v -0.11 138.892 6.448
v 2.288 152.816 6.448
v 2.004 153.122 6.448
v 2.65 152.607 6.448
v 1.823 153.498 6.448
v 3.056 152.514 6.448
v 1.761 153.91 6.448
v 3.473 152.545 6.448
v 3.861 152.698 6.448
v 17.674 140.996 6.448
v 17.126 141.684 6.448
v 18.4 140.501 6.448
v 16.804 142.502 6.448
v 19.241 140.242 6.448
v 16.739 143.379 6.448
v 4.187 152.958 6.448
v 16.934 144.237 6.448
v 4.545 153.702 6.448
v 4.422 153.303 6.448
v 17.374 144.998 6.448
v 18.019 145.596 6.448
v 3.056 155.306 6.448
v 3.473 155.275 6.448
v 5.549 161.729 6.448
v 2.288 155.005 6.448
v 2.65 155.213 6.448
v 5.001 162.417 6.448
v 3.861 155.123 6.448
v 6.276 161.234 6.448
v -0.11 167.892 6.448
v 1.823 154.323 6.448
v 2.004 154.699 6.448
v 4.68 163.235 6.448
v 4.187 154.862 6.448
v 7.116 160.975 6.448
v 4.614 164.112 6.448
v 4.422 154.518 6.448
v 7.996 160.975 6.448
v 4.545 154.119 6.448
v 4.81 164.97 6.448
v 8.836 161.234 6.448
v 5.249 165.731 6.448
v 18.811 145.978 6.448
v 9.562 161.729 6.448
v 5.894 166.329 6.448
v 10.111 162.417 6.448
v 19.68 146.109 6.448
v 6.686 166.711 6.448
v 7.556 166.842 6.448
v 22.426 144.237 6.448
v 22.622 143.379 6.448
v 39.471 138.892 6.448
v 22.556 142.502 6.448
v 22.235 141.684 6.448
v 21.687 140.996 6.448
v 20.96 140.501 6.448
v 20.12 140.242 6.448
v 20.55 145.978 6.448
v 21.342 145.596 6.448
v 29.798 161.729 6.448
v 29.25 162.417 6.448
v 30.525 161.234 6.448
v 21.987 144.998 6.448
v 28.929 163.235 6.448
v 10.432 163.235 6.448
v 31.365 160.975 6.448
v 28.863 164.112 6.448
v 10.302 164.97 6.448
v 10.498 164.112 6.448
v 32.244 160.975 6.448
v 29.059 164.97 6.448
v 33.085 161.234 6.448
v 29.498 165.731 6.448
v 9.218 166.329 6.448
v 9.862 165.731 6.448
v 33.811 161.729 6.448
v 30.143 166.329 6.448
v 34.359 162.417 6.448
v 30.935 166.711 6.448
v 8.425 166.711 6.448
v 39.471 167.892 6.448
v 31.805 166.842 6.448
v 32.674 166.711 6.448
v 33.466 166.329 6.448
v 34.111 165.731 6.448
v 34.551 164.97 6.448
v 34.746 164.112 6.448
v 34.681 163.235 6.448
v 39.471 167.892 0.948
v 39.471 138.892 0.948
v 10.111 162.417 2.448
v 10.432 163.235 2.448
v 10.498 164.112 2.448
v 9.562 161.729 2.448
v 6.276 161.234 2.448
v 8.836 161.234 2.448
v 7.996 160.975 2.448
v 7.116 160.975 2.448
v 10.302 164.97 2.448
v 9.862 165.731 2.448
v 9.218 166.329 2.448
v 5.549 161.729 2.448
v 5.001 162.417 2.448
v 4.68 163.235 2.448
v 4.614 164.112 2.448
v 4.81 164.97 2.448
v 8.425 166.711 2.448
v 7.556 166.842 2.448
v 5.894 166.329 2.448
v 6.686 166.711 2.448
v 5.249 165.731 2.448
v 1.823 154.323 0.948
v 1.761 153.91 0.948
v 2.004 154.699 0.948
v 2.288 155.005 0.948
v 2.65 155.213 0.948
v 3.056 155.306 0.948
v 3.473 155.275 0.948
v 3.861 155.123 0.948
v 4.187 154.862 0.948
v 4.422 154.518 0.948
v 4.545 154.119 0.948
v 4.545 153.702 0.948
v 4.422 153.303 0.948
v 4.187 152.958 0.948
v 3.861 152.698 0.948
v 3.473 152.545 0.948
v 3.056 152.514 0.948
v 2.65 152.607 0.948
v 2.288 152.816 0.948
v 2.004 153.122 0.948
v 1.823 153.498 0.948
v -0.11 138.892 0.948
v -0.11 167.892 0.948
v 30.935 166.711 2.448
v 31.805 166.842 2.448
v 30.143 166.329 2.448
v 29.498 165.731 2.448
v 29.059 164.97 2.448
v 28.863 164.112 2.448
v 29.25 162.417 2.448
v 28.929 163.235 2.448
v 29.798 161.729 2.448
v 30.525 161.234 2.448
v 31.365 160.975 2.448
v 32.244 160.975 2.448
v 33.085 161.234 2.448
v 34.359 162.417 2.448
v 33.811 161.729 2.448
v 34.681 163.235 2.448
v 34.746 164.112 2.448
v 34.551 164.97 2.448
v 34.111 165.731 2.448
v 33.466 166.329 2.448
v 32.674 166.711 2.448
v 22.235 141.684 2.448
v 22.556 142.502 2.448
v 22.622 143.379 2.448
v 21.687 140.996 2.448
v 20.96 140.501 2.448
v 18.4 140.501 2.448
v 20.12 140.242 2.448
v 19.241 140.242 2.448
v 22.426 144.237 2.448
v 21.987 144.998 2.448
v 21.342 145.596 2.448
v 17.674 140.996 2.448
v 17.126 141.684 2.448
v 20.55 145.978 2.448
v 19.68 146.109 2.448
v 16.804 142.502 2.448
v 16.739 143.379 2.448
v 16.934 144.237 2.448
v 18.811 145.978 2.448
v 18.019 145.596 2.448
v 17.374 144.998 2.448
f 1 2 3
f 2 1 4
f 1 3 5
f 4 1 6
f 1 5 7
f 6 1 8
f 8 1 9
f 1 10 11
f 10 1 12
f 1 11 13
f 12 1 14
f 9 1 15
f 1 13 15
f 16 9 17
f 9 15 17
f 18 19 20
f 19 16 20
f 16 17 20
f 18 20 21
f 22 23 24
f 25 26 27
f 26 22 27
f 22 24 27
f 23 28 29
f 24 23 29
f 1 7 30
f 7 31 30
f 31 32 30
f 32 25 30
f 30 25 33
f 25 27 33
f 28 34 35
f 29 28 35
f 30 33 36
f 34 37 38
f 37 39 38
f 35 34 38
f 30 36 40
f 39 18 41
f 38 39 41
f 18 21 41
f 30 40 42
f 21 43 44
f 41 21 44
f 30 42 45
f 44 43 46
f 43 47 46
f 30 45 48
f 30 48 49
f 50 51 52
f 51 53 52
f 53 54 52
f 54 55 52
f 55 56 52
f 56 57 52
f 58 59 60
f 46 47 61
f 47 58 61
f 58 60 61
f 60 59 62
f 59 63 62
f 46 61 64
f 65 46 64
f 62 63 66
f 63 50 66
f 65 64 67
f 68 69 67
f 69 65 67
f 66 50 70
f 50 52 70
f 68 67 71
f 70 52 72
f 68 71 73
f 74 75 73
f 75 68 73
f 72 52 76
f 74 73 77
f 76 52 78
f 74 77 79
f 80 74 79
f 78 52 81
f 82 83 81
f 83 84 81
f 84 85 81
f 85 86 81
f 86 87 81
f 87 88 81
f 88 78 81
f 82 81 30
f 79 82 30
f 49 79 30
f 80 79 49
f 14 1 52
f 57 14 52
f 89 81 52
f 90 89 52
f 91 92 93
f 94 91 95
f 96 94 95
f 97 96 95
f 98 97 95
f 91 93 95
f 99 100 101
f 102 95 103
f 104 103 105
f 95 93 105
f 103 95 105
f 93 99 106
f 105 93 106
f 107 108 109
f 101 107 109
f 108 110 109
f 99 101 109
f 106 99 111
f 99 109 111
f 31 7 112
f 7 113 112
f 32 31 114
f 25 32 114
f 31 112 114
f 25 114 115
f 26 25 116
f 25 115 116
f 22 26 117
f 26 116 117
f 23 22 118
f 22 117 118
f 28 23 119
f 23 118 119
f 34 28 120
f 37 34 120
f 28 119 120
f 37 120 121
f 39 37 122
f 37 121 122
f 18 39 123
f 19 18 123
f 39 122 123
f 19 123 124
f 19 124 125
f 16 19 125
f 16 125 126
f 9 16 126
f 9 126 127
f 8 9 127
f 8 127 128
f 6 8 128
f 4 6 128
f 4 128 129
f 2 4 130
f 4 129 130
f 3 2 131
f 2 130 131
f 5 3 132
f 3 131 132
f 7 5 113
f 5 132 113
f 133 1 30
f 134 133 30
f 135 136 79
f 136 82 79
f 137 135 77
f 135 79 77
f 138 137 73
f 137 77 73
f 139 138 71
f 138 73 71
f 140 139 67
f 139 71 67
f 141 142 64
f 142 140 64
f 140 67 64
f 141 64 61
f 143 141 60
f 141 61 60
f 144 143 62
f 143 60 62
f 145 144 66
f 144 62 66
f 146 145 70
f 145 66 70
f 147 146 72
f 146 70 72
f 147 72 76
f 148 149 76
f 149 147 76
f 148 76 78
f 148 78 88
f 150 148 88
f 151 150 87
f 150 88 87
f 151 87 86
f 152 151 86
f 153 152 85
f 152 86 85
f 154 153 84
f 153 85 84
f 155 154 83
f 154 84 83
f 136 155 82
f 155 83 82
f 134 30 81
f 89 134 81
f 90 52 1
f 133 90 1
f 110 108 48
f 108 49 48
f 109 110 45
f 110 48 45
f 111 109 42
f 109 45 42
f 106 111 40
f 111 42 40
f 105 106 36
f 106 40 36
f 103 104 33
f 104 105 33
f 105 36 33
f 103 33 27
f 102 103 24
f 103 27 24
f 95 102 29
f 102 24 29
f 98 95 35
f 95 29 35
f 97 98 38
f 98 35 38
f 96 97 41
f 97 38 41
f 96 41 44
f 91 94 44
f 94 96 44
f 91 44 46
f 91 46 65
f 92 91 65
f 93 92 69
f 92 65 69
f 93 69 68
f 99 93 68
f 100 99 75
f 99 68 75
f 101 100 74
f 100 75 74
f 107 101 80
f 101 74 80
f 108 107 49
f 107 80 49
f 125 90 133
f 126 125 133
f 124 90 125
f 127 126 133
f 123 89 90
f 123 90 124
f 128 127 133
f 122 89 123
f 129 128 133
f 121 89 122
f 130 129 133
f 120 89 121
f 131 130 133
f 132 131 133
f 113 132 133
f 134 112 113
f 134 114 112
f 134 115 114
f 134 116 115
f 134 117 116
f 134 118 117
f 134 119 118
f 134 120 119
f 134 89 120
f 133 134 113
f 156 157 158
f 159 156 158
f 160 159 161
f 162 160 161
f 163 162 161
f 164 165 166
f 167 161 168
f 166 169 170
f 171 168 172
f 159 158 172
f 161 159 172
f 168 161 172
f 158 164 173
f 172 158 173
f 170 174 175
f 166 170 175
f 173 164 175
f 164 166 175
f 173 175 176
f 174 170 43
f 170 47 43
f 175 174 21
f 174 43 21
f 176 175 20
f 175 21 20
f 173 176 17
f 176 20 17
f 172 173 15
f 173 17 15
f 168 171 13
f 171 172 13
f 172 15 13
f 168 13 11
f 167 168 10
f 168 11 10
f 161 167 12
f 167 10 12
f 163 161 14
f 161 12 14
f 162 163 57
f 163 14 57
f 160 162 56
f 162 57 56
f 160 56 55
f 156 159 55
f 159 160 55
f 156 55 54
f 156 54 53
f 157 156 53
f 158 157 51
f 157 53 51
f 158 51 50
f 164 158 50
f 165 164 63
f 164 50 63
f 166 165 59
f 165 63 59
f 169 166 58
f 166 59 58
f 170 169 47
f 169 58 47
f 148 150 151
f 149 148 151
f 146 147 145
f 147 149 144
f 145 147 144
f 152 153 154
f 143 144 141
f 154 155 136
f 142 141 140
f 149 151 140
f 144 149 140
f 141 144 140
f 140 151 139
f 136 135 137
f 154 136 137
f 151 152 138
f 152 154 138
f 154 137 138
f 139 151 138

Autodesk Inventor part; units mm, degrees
ref_plane "YZ Plane" through (0, 0, 0) normal (1, 0, 0) x (0, 1, 0)
ref_plane "XZ Plane" through (0, 0, 0) normal (0, 1, 0) x (-1, 0, 0)
ref_plane "XY Plane" through (0, 0, 0) normal (0, 0, 1) x (1, 0, 0)
ref_plane "Work Plane1" through (52.5141, 202.7033, 6.4479) normal (0, 0, -1) x (0, 1, 0)
sketch "Sketch1" plane through (52.5141, 202.7033, 6.4479) normal (0, 0, -1) x (0, 1, 0)
  line L0 (-34.8114, -13.0433) -> (-63.8114, -13.0433)
  line L1 (-63.8114, -13.0433) -> (-63.8114, -52.6244)
  line L2 (-63.8114, -52.6244) -> (-34.8114, -52.6244)
  line L3 (-34.8114, -52.6244) -> (-34.8114, -13.0433)
  circle A0 centre (-59.5444, -32.8338) radius 2.95
  circle A1 centre (-38.8114, -20.7095) radius 2.95
  circle A2 centre (-38.8114, -44.9582) radius 2.95 construction
  line L4 (-60.26, -25.0657) -> (-36.5, -25.0657) construction
  line L5 (-36.5, -25.0657) -> (-36.5, -52.0657) construction
  line L6 (-60.26, -52.0657) -> (-60.26, -25.0657) construction
  line L7 (-57.1632, -22.5233) -> (-33.4032, -22.5233) construction
  line L8 (-33.4032, -22.5233) -> (-33.4032, -49.5233) construction
  line L9 (-33.4032, -49.5233) -> (-57.1632, -49.5233) construction
  line L10 (-57.1632, -49.5233) -> (-57.1632, -22.5233) construction
  circle A3 centre (-38.8114, -44.9582) radius 2.95
  point P0 (-202.7033, -52.5141)
  point P1 (-56.7146, -27.9576)
  point P2 (-25.3114, -32.8338)
  dimension "d4" = 5.9
  dimension "d5" = 5.9
  dimension "d6" = 5.9
  dimension "d37" = 12.1244
  dimension "d38" = 12.1244
extrude "Extrusion1" add sketch "Sketch1" along normal blind 4
sketch "Sketch2" plane through (52.5141, 202.7033, 2.4479) normal (0, 0, -1) x (-1, 0, 0)
  circle A0 centre (44.9582, -38.8114) radius 2.95 projected
  circle A1 centre (20.7095, -38.8114) radius 2.95 projected
  circle A2 centre (32.8338, -59.5444) radius 2.95 projected
  line L0 (13.0433, -34.8114) -> (13.0433, -63.8114) projected
  line L1 (13.0433, -63.8114) -> (52.6244, -63.8114) projected
  line L2 (52.6244, -63.8114) -> (52.6244, -34.8114) projected
  line L3 (52.6244, -34.8114) -> (13.0433, -34.8114) projected
  point P0 (52.5141, -202.7033)
extrude "Extrusion2" add sketch "Sketch2" along normal blind 1.5 contours A0 | A1 | A2 | L3 L2 L1 L0
sketch "Sketch5" plane through (52.5141, 202.7033, 0.9479) normal (0, 0, -1) x (-1, 0, 0)
  arc A0 (46.5221, -54.1283) -> (46.5221, -43.4579) centre (46.5221, -48.7931) ccw projected
  circle A1 centre (49.353, -48.7931) radius 1.4
  point P0 (52.5141, -202.7033)
  dimension "d30" = 2.8
extrude "Extrusion5" cut sketch "Sketch5" against normal through all
equation "\"d31\" = d30"
properties part number "cellSTORM_v5_chiptray_old_0"
